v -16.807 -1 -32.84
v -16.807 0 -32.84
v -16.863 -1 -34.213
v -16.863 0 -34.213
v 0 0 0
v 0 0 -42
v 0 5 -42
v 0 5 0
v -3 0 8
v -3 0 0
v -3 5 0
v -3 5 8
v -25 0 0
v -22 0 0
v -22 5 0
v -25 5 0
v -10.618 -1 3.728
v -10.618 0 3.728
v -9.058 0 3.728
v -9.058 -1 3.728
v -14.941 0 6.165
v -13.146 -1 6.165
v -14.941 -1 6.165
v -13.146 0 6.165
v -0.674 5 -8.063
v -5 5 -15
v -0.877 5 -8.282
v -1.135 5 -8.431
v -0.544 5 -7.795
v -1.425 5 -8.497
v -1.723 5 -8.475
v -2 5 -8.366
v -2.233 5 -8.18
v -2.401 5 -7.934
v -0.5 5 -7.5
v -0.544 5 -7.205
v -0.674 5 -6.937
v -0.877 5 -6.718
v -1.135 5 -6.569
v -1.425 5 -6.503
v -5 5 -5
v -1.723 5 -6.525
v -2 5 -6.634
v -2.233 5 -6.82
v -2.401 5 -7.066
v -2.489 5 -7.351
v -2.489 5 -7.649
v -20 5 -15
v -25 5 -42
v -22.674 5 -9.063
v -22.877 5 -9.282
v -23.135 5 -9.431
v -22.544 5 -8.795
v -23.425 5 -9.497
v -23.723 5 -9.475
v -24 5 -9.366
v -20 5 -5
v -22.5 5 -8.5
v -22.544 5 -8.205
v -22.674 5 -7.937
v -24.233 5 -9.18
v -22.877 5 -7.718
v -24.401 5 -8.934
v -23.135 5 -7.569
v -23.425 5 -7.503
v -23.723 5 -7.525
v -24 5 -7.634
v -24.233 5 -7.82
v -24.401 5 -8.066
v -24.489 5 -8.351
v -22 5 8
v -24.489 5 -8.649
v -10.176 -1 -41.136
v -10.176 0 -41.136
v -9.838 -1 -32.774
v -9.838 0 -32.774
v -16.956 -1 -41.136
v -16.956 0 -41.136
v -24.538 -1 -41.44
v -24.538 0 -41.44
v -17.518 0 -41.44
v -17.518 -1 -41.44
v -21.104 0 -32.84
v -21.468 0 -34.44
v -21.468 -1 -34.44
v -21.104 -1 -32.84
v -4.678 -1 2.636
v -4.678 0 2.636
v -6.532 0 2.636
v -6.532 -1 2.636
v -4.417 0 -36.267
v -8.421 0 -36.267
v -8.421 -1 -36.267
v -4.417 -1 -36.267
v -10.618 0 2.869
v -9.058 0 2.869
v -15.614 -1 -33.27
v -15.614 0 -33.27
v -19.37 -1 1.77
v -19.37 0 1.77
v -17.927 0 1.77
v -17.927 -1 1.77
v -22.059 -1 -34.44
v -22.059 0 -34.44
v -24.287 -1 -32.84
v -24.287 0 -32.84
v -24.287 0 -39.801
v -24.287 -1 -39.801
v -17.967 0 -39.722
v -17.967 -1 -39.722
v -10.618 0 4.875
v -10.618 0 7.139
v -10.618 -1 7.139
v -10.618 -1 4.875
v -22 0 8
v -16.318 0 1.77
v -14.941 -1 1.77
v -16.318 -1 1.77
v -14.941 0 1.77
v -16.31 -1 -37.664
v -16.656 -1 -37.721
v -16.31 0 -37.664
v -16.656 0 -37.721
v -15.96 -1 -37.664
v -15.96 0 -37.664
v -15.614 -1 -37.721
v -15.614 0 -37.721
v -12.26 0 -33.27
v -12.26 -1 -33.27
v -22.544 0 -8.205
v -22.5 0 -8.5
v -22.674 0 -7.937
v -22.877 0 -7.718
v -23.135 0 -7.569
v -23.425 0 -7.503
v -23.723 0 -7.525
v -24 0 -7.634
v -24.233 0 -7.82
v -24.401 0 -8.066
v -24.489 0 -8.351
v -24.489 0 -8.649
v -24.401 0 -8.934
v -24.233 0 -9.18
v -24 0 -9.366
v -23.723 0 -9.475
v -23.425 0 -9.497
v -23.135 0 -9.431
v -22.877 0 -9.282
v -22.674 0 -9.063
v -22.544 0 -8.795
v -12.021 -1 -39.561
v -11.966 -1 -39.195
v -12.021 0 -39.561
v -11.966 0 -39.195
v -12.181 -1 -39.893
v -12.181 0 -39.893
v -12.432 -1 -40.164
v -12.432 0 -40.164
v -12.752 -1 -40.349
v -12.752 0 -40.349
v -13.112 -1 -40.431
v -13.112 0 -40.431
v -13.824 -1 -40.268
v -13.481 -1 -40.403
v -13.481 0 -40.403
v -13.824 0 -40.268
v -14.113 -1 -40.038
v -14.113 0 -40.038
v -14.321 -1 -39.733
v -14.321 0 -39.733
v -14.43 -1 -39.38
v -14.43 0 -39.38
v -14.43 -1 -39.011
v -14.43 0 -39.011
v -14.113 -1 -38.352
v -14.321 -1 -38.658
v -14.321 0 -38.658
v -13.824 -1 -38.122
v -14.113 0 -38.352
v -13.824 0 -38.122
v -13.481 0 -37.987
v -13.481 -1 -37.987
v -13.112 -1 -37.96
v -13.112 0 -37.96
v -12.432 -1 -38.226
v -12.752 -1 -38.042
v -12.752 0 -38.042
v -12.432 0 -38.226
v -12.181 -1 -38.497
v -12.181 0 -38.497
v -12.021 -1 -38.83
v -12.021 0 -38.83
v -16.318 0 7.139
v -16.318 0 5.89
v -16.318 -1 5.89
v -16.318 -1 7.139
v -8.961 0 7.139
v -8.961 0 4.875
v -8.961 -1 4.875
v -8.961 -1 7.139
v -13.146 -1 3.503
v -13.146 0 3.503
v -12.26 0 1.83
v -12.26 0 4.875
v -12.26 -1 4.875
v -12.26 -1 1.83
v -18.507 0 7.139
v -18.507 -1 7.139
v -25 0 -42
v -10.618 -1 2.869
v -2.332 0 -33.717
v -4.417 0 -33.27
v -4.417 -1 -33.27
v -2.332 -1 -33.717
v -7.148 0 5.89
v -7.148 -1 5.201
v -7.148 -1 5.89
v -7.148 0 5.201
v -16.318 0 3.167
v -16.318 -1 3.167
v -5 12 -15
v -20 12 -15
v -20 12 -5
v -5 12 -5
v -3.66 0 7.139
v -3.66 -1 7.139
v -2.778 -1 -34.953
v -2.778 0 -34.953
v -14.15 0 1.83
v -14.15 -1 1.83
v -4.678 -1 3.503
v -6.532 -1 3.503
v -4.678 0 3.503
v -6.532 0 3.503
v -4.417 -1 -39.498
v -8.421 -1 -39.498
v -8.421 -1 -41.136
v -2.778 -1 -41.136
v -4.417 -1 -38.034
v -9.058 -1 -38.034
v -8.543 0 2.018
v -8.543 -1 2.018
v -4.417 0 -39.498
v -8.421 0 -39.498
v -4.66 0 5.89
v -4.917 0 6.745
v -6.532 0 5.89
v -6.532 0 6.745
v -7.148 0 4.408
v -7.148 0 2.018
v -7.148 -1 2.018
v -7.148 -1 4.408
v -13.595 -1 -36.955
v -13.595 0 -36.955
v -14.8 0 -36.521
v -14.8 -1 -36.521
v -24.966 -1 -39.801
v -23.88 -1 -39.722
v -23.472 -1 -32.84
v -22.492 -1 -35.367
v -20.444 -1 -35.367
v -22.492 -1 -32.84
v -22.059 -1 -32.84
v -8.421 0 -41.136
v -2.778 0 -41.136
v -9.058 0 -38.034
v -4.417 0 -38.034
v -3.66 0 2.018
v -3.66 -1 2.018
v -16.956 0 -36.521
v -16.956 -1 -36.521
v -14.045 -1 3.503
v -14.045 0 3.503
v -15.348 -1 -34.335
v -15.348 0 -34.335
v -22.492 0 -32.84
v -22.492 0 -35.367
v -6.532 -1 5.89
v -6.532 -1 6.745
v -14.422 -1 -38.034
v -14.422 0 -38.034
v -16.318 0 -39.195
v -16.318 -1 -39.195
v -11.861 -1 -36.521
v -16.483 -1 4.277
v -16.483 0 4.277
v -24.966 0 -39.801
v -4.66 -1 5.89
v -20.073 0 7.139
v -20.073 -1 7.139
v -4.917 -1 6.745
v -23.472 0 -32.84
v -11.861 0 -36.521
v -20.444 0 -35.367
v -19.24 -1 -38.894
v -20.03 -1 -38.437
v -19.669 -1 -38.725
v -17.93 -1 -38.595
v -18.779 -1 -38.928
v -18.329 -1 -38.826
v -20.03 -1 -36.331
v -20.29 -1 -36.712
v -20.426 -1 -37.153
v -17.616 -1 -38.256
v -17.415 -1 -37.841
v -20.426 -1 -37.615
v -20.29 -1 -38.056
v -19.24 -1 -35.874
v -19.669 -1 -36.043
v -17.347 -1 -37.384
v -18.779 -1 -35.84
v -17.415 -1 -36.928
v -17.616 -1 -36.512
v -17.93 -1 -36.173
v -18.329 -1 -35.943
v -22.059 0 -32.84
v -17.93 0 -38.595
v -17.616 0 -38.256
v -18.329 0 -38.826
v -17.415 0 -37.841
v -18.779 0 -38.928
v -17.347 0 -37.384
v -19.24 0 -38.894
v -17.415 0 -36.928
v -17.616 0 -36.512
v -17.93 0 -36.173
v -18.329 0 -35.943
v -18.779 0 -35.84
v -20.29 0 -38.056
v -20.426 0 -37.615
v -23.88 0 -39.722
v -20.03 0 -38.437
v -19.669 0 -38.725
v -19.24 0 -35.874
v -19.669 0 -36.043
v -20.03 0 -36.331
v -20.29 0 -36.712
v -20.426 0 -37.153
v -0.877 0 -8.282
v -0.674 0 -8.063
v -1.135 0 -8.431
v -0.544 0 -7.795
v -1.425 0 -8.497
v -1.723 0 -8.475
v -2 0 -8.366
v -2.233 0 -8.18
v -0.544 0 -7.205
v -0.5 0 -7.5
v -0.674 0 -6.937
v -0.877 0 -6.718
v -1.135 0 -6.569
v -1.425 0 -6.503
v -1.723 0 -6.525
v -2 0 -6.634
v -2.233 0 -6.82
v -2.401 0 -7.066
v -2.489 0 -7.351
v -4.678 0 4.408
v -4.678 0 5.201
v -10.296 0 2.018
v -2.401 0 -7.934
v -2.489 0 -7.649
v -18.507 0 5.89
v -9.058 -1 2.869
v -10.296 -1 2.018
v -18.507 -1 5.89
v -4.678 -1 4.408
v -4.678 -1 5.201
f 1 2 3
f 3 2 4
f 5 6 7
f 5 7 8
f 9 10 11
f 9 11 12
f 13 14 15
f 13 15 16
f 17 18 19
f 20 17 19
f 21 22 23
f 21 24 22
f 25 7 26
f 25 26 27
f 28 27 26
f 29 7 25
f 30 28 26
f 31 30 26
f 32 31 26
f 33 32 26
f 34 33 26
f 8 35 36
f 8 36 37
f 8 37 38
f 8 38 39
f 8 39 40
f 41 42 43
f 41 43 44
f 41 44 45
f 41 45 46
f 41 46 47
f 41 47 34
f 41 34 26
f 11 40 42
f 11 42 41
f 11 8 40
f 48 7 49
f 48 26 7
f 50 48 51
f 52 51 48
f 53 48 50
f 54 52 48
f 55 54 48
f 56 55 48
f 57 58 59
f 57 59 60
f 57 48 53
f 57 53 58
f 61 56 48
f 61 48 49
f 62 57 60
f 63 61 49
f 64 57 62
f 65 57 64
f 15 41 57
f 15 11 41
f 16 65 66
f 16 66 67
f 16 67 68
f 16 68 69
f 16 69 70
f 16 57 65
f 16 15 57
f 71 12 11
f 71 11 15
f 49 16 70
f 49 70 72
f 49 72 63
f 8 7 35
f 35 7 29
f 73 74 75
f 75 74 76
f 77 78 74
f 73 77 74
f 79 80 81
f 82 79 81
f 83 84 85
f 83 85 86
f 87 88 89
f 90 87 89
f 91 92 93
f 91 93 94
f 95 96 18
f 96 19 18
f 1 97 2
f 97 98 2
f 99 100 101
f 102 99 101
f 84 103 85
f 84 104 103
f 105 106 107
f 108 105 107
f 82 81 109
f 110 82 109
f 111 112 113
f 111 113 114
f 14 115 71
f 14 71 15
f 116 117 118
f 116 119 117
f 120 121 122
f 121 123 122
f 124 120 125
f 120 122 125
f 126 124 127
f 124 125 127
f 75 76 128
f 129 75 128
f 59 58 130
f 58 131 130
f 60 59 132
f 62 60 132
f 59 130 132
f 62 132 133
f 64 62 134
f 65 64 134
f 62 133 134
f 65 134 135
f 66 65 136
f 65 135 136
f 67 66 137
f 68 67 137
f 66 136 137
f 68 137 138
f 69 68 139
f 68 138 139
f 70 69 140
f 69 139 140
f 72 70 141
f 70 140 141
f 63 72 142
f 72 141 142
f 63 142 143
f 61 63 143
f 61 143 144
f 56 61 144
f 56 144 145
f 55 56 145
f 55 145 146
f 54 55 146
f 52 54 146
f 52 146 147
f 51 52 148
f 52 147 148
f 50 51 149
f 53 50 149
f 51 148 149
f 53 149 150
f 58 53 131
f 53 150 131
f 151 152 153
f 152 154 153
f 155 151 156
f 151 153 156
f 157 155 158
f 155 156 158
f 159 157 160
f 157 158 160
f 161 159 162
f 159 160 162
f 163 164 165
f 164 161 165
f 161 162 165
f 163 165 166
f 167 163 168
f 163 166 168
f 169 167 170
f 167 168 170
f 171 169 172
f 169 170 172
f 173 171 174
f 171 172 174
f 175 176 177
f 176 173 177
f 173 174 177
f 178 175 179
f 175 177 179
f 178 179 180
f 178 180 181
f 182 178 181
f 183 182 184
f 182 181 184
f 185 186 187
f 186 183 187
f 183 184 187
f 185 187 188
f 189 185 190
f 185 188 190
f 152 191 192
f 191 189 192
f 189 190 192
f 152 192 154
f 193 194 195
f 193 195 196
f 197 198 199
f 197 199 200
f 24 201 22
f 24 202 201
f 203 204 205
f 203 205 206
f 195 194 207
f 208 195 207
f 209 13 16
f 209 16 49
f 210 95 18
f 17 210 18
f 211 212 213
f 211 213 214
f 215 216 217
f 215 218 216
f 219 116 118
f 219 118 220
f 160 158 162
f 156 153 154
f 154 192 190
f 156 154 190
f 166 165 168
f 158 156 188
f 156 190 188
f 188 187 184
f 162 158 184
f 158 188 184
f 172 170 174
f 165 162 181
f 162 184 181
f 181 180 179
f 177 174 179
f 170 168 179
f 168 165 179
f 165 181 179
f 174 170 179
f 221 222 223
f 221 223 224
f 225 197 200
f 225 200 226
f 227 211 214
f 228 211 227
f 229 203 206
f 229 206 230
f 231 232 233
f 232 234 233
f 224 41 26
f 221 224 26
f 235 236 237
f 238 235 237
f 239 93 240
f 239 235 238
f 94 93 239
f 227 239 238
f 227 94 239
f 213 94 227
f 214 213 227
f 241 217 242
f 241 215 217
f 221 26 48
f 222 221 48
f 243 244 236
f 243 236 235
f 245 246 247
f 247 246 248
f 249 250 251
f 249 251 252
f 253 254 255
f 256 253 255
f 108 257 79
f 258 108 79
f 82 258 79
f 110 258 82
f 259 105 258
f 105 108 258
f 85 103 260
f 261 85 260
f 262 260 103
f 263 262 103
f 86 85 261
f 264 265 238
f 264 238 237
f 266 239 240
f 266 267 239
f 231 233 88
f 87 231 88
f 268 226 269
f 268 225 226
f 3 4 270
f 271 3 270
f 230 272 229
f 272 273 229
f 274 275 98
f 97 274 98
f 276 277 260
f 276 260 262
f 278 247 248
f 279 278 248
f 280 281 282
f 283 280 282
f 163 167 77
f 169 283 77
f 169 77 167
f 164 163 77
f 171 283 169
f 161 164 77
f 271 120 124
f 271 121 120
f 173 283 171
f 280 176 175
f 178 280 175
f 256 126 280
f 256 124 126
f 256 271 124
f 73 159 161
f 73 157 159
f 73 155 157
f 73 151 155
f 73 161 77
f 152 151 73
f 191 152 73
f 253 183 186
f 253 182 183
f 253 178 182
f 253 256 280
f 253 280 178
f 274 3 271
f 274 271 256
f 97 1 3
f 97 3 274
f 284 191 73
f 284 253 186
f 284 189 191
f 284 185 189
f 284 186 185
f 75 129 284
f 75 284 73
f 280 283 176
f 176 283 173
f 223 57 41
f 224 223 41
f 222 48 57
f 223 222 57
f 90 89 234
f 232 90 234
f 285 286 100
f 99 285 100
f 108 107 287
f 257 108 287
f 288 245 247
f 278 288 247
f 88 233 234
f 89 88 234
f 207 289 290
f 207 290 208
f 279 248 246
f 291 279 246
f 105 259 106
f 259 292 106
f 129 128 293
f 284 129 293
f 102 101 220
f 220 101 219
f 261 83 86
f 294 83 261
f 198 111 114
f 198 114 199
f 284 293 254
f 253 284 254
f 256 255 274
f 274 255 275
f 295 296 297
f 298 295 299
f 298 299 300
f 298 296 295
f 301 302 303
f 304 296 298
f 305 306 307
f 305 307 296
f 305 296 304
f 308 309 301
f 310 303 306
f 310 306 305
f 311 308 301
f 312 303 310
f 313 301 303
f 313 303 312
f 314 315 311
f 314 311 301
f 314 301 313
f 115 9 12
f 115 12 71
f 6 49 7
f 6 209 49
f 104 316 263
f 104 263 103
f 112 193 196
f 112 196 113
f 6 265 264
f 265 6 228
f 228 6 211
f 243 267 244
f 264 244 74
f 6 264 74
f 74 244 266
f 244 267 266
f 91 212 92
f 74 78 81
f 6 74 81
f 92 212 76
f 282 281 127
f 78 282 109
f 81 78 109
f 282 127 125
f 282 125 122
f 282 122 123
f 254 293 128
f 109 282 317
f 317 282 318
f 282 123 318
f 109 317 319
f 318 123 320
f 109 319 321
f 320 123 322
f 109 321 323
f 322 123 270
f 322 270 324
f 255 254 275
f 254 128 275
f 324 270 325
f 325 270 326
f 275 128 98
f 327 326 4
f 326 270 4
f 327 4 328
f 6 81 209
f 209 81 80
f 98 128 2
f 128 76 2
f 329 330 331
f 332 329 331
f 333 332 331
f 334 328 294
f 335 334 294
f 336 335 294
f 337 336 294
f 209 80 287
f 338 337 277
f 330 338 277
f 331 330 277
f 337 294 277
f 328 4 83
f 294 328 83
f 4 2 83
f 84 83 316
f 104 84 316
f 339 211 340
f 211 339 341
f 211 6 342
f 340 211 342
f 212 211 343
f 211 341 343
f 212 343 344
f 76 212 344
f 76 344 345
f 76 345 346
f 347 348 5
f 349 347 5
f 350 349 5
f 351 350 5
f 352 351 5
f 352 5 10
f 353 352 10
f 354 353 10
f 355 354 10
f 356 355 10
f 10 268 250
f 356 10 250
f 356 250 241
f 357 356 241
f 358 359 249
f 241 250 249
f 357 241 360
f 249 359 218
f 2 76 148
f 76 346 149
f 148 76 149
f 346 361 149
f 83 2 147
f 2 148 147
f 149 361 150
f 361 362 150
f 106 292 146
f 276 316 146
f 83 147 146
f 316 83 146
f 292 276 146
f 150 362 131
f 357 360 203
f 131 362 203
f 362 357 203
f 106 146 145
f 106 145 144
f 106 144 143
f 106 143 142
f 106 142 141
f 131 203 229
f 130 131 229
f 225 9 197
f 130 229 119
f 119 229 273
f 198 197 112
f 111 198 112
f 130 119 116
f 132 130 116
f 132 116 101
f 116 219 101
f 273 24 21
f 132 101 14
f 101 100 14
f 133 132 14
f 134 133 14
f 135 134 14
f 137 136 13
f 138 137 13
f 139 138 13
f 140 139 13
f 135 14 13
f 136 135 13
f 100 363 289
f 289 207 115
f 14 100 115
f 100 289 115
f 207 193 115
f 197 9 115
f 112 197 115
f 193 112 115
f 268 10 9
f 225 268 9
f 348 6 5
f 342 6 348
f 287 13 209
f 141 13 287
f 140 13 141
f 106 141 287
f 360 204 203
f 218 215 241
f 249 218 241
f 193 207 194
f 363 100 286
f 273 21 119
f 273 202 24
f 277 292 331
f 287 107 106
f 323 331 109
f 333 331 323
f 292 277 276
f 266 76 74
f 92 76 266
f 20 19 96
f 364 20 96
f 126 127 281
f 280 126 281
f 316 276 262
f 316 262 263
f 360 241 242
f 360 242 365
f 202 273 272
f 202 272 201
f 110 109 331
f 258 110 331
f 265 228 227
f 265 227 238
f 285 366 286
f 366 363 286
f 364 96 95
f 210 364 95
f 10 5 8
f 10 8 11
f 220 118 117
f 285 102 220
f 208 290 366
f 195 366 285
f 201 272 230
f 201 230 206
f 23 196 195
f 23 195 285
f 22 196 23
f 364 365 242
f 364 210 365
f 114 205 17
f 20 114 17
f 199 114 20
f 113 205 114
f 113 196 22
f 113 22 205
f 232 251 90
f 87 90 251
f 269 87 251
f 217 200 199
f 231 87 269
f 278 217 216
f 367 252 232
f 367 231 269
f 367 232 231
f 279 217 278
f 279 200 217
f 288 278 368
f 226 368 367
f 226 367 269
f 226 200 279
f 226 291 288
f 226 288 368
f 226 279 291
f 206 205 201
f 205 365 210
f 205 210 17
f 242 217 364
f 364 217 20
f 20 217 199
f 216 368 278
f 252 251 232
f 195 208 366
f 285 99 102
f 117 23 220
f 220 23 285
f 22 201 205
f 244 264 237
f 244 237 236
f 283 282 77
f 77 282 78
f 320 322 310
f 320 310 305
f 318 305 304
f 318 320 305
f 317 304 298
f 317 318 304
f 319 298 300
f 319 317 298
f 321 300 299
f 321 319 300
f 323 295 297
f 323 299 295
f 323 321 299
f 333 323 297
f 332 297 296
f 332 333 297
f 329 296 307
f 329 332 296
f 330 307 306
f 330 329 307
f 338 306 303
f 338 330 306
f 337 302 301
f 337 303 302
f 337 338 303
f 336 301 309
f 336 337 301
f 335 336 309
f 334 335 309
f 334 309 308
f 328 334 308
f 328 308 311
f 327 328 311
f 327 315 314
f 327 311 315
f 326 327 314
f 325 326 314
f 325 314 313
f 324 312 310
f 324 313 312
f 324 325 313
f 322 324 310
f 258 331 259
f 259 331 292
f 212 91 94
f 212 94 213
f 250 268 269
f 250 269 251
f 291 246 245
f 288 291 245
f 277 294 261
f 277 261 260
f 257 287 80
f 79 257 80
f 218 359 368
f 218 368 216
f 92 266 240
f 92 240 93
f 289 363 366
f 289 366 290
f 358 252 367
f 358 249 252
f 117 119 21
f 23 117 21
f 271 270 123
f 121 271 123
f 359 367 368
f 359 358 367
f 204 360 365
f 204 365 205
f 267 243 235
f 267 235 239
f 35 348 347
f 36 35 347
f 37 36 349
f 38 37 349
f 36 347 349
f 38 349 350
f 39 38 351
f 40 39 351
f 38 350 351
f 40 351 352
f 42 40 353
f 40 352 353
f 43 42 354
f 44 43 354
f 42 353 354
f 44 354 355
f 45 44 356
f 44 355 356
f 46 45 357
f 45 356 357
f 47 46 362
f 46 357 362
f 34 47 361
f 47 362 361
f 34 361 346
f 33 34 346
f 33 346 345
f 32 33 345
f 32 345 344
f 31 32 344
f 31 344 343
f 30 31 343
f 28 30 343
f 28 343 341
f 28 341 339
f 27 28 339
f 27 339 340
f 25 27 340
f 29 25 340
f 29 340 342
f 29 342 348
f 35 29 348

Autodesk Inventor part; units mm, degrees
ref_plane "YZ Plane" through (0, 0, 0) normal (1, 0, 0) x (0, 1, 0)
ref_plane "XZ Plane" through (0, 0, 0) normal (0, 1, 0) x (-1, 0, 0)
ref_plane "XY Plane" through (0, 0, 0) normal (0, 0, 1) x (1, 0, 0)
sketch "Sketch1" plane through (0, 0, 0) normal (0, 1, 0) x (-1, 0, 0)
  line L0 (0, 0) -> (25, 0)
  line L1 (25, 0) -> (25, -42)
  line L2 (25, -42) -> (0, -42)
  line L3 (0, -42) -> (0, 0)
  line L4 (22, 0) -> (3, 0)
  line L5 (3, 0) -> (3, 8)
  line L6 (3, 8) -> (22, 8)
  line L7 (22, 8) -> (22, 0)
  point P0 (22, 4)
  dimension "d0" = 19
  dimension "d1" = 3
  dimension "d2" = 3
  dimension "d3" = 42
  dimension "d4" = 25
  dimension "d27" = 8
extrude "Extrusion1" add sketch "Sketch1" along normal blind 5
sketch "Sketch2" plane through (0, 5, 0) normal (0, 1, 0) x (1, 0, 0)
  line L0 (-20, 5) -> (-5, 5)
  line L1 (-5, 5) -> (-5, 15)
  line L2 (-5, 15) -> (-20, 15)
  line L3 (-20, 15) -> (-20, 5)
  line L4 (-25, 0) -> (-22, 0) projected
  line L5 (-25, 42) -> (-25, 0) projected
  line L6 (0, 0) -> (0, 42) projected
  dimension "d7" = 5
  dimension "d8" = 10
  dimension "d25" = 5
  dimension "d26" = 5
extrude "Extrusion2" add sketch "Sketch2" along normal blind 7
sketch "Sketch3" plane through (0, 0, 0) normal (0, -1, 0) x (1, 0, 0)
  circle A0 centre (-1.5, -7.5) radius 1
  line L0 (-3, 0) -> (0, 0) projected
  line L1 (0, 0) -> (0, -42) projected
  circle A1 centre (-23.5, -8.5) radius 1
  line L2 (-25, 0) -> (-22, 0) projected
  line L3 (-25, -42) -> (-25, 0) projected
  dimension "d13" = 2
  dimension "d14" = 7.5
  dimension "d15" = 1.5
  dimension "d16" = 2
  dimension "d17" = 8.5
  dimension "d18" = 1.5
extrude "Extrusion3" cut sketch "Sketch3" against normal blind 7
thread "Thread1" size "M2x0.4" class "6H" standard "ANSI Metric M Profile" full length
thread "Thread2" size "M2x0.4" class "6H" standard "ANSI Metric M Profile" full length
sketch "Sketch4" plane through (0, 0, 0) normal (0, -1, 0) x (1, 0, 0)
  line L0 (-3.66, 7.1394) -> (-3.66, 2.0183)
  line L1 (-3.66, 2.0183) -> (-7.1475, 2.0183)
  line L2 (-7.1475, 5.8905) -> (-7.1475, 7.1394)
  line L3 (-7.1475, 7.1394) -> (-3.66, 7.1394)
  line L4 (-7.1475, 5.8905) -> (-8.5429, 2.0183)
  line L5 (-8.5429, 2.0183) -> (-10.2962, 2.0183)
  line L6 (-10.2962, 2.0183) -> (-12.2596, 4.8754)
  line L7 (-12.2596, 4.8754) -> (-12.2596, 7.1394)
  line L8 (-12.2596, 7.1394) -> (-10.6175, 7.1394)
  line L9 (-10.6175, 7.1394) -> (-10.6175, 4.8754)
  line L10 (-10.6175, 4.8754) -> (-8.9607, 4.8754)
  line L11 (-8.9607, 4.8754) -> (-8.9607, 7.1394)
  line L12 (-8.9607, 7.1394) -> (-7.1475, 7.1394)
  line L13 (-12.2596, 4.8754) -> (-12.2596, 2.0183)
  line L14 (-14.9412, 1.77) -> (-14.9412, 3.503)
  line L15 (-13.1457, 3.503) -> (-13.1457, 6.1648)
  line L16 (-13.1457, 6.1648) -> (-14.9412, 6.1648)
  line L17 (-14.9412, 6.1648) -> (-14.9412, 7.1394)
  line L18 (-12.2596, 7.1394) -> (-14.9412, 7.1394)
  line L19 (-12.2596, 2.0183) -> (-12.2596, 1.8295)
  line L20 (-14.9412, 3.503) -> (-14.9412, 6.1648)
  line L21 (-7.1475, 2.0183) -> (-7.1475, 4.4084)
  line L22 (-7.1475, 4.4084) -> (-4.6775, 4.4084)
  line L23 (-4.6775, 4.4084) -> (-4.6775, 5.2007)
  line L24 (-4.6775, 5.2007) -> (-7.1475, 5.2007)
  line L25 (-7.1475, 5.2007) -> (-7.1475, 5.8905)
  line L26 (-4.6775, 3.503) -> (-4.6775, 2.6365)
  line L27 (-4.6775, 2.6365) -> (-6.5324, 2.6365)
  line L28 (-6.5324, 2.6365) -> (-6.5324, 3.503)
  line L29 (-6.5324, 3.503) -> (-4.6775, 3.503)
  line L30 (-4.66, 5.8905) -> (-6.5324, 5.8905)
  line L31 (-6.5324, 5.8905) -> (-6.5324, 6.7449)
  line L32 (-6.5324, 6.7449) -> (-4.9174, 6.7449)
  line L33 (-4.9174, 6.7449) -> (-4.66, 5.8905)
  line L34 (-14.9412, 1.77) -> (-16.3182, 1.77)
  line L35 (-16.3182, 1.77) -> (-16.3182, 7.1394)
  line L36 (-16.3182, 7.1394) -> (-14.9412, 7.1394)
  line L37 (-18.5068, 5.8905) -> (-16.4834, 4.2767)
  line L38 (-16.4834, 4.2767) -> (-19.3704, 1.77)
  line L39 (-19.3704, 1.77) -> (-17.9269, 1.77)
  line L40 (-17.9269, 1.77) -> (-16.3182, 3.1668)
  line L41 (-18.5068, 5.8905) -> (-20.0727, 7.1394)
  line L42 (-20.0727, 7.1394) -> (-18.5068, 7.1394)
  line L43 (-16.3182, 5.8905) -> (-18.5068, 7.1394)
  line L44 (-9.0583, 2.869) -> (-10.6175, 2.869)
  line L45 (-10.6175, 2.869) -> (-10.6175, 3.7284)
  line L46 (-10.6175, 3.7284) -> (-9.0583, 3.7284)
  line L47 (-9.0583, 3.7284) -> (-9.0583, 2.869)
  line L48 (-14.0417, 3.5591) -> (-14.15, 1.8295)
  line L49 (-12.2596, 1.8295) -> (-14.15, 1.8295)
  line L50 (-14.0452, 3.503) -> (-13.1457, 3.503)
  line L51 (-2.7778, -34.9531) -> (-2.7778, -41.136)
  line L52 (-2.7778, -41.136) -> (-8.4213, -41.136)
  line L53 (-8.4213, -41.136) -> (-8.4213, -39.4983)
  line L54 (-8.4213, -39.4983) -> (-4.4166, -39.4983)
  line L55 (-4.4166, -39.4983) -> (-4.4166, -38.0343)
  line L56 (-4.4166, -38.0343) -> (-9.0583, -38.0343)
  line L57 (-9.0583, -38.0343) -> (-8.4213, -36.2667)
  line L58 (-8.4213, -36.2667) -> (-4.4166, -36.2667)
  line L59 (-4.4166, -36.2667) -> (-4.4166, -33.2701)
  line L60 (-4.4166, -33.2701) -> (-2.3323, -33.7168)
  line L61 (-2.3323, -33.7168) -> (-2.7778, -34.9531)
  line L62 (-10.176, -41.136) -> (-9.8379, -32.7739)
  line L63 (-9.8379, -32.7739) -> (-12.2596, -33.2701)
  line L64 (-12.2596, -33.2701) -> (-11.8606, -36.5207)
  line L65 (-11.8606, -36.5207) -> (-13.5954, -36.9549)
  line L66 (-13.5954, -36.9549) -> (-14.8005, -36.5207)
  line L67 (-14.8005, -36.5207) -> (-15.3476, -34.335)
  line L68 (-15.3476, -34.335) -> (-15.6141, -33.2701)
  line L69 (-15.6141, -33.2701) -> (-16.8071, -32.8402)
  line L70 (-16.8071, -32.8402) -> (-16.8627, -34.2134)
  line L71 (-16.8627, -34.2134) -> (-16.9559, -36.5207)
  line L72 (-16.9559, -36.5207) -> (-16.6555, -37.7209)
  arc A0 (-15.6141, -37.7209) -> (-16.6555, -37.7209) centre (-16.1348, -39.8012) ccw
  line L73 (-15.6141, -37.7209) -> (-14.4216, -38.0343)
  line L74 (-14.4216, -38.0343) -> (-16.3182, -39.1953)
  line L75 (-16.3182, -39.1953) -> (-16.9559, -41.136)
  line L76 (-16.9559, -41.136) -> (-10.176, -41.136)
  circle A1 centre (-13.2048, -39.1953) radius 1.2392
  circle A2 centre (-18.8951, -37.3841) radius 1.5485
  line L77 (-21.1041, -32.8402) -> (-20.4436, -35.3671)
  line L78 (-20.4436, -35.3671) -> (-22.4923, -35.3671)
  line L79 (-22.4923, -35.3671) -> (-22.4923, -32.8402)
  line L80 (-22.4923, -32.8402) -> (-22.059, -32.8402)
  line L81 (-22.059, -32.8402) -> (-22.059, -34.4396)
  line L82 (-22.059, -34.4396) -> (-21.468, -34.4396)
  line L83 (-21.468, -34.4396) -> (-21.1041, -32.8402)
  line L84 (-23.4723, -32.8402) -> (-24.287, -32.8402)
  line L85 (-24.287, -32.8402) -> (-24.287, -39.8012)
  line L86 (-24.287, -39.8012) -> (-24.9664, -39.8012)
  line L87 (-24.9664, -39.8012) -> (-24.538, -41.4401)
  line L88 (-24.538, -41.4401) -> (-17.5177, -41.4401)
  line L89 (-17.5177, -41.4401) -> (-17.9667, -39.7224)
  line L90 (-17.9667, -39.7224) -> (-23.8797, -39.7224)
  line L91 (-23.8797, -39.7224) -> (-23.4723, -32.8402)
  point P0 (0, 0)
extrude "Extrusion4" add sketch "Sketch4" along normal blind 1
properties part number "Head"
